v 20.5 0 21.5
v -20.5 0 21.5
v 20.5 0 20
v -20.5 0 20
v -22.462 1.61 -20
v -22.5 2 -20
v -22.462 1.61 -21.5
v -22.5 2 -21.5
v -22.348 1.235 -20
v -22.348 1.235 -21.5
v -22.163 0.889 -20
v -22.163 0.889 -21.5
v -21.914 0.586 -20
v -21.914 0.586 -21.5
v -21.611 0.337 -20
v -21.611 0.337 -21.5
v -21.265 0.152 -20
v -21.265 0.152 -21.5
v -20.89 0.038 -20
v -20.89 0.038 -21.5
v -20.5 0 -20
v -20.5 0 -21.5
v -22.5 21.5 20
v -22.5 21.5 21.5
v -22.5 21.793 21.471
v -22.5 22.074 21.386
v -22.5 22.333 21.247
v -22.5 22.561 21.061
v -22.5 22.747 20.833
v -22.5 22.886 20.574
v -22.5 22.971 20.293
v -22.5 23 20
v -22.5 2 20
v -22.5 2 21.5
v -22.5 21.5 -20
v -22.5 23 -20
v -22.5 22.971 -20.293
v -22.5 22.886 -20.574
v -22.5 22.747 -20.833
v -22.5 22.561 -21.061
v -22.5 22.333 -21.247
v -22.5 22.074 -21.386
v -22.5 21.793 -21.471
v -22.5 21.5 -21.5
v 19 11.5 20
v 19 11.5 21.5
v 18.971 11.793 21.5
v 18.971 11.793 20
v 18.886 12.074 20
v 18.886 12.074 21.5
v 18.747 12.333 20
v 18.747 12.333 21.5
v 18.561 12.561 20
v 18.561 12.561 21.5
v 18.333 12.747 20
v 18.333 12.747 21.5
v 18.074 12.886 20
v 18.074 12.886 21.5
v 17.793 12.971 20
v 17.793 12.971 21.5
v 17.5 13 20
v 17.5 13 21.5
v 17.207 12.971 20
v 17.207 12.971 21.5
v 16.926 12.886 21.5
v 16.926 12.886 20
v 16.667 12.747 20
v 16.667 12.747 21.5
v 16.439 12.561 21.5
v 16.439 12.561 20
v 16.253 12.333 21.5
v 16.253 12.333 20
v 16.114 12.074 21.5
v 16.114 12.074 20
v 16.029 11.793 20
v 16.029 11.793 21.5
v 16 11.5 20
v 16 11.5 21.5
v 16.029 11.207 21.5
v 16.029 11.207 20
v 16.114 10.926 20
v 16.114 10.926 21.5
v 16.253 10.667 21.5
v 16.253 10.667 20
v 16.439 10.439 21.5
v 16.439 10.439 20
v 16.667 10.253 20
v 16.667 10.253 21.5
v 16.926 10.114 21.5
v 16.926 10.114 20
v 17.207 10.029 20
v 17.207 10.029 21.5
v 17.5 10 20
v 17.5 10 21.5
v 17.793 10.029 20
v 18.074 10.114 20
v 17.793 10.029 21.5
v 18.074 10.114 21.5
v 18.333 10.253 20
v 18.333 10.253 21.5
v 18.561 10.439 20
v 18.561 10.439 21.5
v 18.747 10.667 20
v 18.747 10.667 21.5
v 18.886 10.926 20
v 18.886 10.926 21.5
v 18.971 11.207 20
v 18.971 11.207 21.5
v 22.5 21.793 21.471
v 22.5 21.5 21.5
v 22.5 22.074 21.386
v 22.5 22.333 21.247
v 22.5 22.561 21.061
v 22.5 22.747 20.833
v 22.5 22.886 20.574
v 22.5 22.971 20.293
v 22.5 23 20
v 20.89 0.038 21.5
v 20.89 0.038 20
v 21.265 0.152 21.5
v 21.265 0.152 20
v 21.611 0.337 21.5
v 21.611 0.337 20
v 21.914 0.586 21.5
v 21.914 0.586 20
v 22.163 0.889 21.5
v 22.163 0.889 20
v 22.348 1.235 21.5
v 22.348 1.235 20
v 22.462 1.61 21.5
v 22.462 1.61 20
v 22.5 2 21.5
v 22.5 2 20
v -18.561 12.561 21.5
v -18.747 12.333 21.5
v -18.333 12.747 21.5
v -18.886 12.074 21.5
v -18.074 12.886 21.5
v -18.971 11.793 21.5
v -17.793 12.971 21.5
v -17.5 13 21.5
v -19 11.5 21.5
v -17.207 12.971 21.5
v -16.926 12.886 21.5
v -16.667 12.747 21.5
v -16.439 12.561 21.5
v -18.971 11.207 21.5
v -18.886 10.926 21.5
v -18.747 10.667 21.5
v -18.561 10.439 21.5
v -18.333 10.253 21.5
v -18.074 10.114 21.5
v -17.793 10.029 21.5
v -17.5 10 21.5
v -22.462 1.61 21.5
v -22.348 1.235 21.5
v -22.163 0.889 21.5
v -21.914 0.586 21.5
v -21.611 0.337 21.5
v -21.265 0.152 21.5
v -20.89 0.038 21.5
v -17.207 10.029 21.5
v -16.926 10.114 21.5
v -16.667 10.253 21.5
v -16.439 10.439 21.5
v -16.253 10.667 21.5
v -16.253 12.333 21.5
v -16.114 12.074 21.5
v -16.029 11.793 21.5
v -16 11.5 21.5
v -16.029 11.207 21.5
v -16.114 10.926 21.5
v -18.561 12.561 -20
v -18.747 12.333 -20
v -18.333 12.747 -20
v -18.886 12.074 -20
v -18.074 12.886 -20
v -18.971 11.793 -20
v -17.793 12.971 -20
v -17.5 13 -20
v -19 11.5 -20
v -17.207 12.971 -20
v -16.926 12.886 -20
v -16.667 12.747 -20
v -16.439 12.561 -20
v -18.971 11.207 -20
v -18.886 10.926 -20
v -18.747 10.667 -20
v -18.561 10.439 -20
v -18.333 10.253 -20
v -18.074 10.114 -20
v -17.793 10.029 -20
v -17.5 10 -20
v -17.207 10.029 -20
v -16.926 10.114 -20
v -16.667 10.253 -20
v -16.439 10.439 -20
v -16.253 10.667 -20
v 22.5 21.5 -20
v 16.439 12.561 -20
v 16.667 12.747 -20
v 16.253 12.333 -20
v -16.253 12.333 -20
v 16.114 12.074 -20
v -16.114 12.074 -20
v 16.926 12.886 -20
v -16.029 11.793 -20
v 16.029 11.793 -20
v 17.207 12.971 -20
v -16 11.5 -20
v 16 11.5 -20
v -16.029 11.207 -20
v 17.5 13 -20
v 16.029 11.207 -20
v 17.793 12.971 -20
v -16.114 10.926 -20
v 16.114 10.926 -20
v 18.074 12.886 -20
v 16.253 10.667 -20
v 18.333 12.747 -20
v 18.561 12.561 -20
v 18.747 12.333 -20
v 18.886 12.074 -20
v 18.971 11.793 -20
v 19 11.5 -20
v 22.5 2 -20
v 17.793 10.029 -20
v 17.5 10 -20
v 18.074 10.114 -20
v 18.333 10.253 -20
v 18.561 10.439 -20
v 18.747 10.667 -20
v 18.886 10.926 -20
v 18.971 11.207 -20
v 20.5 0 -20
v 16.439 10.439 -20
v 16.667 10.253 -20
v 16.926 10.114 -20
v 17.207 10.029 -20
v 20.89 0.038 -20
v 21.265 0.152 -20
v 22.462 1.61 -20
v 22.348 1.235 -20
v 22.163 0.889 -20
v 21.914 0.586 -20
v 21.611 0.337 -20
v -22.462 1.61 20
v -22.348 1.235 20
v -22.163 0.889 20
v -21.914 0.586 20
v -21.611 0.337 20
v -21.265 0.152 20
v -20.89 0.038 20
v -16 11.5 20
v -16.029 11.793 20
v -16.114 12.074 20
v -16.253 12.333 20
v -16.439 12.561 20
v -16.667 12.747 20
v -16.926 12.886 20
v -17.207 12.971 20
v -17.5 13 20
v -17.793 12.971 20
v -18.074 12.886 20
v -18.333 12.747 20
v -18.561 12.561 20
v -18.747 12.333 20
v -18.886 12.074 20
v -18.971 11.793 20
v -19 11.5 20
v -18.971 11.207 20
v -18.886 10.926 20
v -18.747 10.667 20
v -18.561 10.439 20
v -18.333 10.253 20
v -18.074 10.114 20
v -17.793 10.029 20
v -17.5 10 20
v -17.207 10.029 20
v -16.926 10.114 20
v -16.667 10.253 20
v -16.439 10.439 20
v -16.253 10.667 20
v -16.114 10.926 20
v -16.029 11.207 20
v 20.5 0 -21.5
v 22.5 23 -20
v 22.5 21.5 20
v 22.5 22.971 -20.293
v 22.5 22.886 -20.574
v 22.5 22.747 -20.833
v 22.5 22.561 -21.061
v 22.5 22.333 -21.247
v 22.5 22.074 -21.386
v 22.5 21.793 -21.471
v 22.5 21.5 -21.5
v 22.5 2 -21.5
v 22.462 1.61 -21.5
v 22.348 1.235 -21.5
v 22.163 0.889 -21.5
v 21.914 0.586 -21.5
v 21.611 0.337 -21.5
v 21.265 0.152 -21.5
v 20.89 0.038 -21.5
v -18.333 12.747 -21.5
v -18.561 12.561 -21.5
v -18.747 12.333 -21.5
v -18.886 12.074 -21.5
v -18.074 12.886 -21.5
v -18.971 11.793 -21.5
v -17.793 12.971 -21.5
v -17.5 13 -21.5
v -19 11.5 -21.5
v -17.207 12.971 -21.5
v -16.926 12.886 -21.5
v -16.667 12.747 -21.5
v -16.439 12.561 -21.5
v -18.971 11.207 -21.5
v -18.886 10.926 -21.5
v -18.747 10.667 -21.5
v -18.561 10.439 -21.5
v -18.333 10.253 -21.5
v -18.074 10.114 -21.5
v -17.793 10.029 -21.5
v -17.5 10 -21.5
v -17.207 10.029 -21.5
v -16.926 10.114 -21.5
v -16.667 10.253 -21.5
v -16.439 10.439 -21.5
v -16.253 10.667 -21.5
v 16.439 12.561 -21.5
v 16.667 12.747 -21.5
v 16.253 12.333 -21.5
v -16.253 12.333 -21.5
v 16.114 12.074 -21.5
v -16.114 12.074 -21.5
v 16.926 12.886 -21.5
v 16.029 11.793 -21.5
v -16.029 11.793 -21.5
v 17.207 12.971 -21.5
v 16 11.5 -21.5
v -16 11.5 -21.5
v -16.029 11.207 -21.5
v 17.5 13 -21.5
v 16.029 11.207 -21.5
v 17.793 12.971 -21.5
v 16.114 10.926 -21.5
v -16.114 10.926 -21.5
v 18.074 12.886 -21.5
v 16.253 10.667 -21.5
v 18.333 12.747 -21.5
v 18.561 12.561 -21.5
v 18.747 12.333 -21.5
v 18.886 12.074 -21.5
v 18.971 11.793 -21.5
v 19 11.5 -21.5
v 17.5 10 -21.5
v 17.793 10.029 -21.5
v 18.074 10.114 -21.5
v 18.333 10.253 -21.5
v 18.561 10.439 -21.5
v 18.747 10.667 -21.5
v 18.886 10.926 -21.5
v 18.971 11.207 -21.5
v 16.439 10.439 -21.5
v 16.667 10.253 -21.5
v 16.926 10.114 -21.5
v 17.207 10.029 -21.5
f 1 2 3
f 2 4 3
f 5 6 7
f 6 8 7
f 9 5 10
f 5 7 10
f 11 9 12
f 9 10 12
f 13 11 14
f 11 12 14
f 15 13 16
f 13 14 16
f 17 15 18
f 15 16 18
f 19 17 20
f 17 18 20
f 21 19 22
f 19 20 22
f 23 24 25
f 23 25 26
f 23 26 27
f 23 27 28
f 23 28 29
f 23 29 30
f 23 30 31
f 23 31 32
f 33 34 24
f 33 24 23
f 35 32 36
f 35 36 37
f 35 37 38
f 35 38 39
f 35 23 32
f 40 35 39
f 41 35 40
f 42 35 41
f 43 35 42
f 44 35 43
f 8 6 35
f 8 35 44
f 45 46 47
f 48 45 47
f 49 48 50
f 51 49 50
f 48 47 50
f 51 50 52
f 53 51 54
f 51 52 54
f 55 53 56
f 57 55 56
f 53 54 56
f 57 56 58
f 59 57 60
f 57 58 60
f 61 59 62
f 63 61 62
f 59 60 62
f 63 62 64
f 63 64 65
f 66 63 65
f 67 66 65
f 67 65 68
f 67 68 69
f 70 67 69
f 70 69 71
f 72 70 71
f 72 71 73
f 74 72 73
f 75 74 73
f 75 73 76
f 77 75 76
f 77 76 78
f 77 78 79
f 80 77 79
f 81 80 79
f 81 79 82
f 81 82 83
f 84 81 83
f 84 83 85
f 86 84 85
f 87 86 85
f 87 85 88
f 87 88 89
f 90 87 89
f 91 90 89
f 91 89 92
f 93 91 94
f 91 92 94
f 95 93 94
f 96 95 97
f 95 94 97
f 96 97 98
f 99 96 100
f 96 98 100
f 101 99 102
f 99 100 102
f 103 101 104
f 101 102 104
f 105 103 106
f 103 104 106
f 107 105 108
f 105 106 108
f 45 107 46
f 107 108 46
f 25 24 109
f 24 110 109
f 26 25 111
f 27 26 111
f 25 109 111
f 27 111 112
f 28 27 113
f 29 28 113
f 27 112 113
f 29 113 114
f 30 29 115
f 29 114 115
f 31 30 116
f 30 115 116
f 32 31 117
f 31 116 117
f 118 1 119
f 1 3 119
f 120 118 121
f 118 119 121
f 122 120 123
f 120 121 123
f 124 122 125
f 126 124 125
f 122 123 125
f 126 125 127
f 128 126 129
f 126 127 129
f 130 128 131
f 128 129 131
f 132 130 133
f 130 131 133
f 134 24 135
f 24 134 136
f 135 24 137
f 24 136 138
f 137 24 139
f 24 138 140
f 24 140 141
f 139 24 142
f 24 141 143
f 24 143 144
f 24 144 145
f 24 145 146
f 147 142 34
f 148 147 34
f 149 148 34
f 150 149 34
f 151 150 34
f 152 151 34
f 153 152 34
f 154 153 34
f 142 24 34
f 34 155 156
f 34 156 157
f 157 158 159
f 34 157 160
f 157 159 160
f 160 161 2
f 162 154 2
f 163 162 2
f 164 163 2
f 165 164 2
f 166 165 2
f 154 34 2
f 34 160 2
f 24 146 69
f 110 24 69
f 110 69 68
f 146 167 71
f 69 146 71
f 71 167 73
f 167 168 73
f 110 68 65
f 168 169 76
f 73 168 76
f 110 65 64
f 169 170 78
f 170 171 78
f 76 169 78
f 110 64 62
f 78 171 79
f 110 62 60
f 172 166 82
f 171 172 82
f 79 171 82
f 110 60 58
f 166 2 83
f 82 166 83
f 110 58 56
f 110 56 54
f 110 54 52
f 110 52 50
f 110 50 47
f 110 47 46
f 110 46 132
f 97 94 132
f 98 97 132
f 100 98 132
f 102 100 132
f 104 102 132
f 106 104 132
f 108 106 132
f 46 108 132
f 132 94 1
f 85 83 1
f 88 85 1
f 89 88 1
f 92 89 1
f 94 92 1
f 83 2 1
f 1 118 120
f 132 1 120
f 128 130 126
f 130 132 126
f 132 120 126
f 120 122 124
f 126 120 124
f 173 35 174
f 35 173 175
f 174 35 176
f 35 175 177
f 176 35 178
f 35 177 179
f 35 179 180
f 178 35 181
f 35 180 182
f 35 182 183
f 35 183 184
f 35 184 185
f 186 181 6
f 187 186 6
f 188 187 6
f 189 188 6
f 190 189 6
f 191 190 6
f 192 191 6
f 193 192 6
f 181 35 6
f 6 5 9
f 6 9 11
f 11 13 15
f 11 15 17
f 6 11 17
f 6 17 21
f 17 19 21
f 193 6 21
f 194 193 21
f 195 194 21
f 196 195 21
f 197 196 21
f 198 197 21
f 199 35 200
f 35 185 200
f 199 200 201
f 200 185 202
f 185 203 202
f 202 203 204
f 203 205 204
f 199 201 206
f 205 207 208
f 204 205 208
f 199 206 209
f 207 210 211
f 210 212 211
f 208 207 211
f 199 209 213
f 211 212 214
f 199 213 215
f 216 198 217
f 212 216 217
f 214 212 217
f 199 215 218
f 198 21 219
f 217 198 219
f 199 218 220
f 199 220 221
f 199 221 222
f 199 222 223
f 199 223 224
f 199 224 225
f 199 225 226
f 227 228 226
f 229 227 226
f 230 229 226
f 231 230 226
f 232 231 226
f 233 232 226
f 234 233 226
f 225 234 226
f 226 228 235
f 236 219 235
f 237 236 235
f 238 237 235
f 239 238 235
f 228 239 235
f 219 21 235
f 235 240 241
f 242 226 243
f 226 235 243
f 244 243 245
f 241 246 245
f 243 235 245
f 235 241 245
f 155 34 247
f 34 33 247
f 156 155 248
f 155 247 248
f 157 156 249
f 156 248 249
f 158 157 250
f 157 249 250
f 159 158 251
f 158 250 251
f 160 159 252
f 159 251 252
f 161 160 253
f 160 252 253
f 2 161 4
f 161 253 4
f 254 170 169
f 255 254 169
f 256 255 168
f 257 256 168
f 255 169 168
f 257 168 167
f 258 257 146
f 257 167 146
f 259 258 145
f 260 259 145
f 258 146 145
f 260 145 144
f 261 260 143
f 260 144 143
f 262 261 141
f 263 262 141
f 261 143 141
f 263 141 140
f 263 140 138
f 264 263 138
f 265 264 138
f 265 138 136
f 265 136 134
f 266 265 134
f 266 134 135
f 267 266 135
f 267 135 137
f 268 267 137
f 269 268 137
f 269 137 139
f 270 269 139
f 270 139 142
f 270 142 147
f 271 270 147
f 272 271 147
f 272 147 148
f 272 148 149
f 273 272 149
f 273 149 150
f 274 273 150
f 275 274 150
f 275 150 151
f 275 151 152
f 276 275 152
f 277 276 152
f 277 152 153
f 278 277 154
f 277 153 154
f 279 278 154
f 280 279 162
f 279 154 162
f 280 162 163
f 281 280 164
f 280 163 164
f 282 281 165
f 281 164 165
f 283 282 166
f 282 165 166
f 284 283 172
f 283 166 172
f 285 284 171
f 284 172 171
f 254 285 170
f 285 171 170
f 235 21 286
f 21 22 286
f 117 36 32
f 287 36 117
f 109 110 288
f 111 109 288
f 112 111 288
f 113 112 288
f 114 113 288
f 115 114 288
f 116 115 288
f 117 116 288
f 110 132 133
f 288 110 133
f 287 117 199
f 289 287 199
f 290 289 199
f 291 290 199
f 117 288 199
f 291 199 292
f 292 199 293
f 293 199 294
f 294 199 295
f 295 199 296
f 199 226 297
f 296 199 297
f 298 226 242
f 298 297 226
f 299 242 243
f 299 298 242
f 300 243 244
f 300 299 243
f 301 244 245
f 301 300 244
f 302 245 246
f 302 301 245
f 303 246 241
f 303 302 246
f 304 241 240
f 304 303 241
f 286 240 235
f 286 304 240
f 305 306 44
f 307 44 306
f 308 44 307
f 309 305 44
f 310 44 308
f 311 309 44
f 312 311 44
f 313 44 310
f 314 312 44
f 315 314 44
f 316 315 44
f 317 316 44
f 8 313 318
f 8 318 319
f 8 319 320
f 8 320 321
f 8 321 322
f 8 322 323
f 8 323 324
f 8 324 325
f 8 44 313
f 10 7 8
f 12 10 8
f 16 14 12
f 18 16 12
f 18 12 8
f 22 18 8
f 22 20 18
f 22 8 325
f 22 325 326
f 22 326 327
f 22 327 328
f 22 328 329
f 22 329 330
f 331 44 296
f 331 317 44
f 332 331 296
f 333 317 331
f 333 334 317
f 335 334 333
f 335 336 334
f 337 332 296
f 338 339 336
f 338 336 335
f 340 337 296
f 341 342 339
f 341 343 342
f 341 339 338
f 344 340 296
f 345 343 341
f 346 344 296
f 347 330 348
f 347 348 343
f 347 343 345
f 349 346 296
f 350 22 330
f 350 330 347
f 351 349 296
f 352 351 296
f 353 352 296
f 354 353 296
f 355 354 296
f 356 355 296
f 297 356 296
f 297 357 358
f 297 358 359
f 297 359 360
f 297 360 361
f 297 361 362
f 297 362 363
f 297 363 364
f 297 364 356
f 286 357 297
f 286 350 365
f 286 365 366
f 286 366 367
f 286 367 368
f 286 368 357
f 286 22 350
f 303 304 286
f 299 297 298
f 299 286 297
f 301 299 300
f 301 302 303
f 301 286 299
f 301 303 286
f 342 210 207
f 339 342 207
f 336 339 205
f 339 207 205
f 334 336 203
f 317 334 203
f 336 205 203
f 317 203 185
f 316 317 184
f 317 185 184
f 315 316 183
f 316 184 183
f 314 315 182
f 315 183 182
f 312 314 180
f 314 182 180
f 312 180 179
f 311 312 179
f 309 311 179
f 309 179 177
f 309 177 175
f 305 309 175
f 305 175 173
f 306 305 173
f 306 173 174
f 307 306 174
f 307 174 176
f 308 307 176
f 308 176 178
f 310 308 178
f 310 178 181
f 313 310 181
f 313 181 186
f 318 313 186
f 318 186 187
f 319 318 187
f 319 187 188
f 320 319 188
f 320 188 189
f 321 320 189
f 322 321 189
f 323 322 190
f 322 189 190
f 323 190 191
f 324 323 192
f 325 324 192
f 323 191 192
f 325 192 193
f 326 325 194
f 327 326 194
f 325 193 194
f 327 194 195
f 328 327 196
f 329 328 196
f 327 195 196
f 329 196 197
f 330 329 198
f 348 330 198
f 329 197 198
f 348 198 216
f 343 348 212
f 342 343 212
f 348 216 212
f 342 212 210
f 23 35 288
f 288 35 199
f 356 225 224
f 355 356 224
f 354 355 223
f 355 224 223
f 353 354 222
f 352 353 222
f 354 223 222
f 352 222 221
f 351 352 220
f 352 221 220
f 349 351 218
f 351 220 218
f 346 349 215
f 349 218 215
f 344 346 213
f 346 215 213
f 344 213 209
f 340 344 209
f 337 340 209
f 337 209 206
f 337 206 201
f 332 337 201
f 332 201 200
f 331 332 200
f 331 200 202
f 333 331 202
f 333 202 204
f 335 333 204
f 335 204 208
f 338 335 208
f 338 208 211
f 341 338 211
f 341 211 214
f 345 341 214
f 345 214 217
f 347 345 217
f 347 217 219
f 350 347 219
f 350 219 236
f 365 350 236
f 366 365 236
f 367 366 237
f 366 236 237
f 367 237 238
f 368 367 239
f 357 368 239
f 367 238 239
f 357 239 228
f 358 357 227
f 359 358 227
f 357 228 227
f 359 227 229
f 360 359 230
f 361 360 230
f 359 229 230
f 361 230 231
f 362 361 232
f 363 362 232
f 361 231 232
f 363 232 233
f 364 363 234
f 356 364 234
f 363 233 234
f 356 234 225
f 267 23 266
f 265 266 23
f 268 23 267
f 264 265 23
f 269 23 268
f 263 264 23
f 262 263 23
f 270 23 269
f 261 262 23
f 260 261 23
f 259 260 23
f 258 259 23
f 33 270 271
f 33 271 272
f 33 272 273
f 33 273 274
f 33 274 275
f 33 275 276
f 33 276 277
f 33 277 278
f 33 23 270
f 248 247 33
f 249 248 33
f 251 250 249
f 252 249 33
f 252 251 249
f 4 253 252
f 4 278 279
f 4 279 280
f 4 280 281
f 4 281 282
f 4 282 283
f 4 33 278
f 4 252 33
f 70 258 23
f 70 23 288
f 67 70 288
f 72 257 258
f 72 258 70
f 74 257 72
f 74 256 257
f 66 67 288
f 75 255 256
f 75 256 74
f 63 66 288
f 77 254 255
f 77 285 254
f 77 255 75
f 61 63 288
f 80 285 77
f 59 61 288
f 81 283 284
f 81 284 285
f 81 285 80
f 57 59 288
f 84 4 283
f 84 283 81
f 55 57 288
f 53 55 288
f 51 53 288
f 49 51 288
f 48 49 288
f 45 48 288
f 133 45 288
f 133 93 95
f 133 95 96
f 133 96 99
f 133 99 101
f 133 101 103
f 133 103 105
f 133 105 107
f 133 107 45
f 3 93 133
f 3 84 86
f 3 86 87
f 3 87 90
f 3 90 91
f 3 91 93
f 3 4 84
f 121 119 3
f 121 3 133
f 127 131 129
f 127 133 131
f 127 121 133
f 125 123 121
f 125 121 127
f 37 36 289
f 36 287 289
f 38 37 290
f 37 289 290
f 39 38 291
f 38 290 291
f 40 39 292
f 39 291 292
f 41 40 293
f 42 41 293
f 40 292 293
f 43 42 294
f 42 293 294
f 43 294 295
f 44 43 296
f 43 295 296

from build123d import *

# Parameters (mm, degrees)
SKETCH_1_W          = 45
SKETCH_1_H          = 43
EXTRUDE_1_DEPTH     = 23
SHELL_1_T           = -1.5
SKETCH_2_R          = 1.5
CUT_EXTRUDE_1_DEPTH = 54.7052139
FILLET_1_R          = 1.5
FILLET_2_R          = 2


with BuildPart() as part:
    # 草图1 → 凸台-拉伸1 (new body)
    with BuildSketch(Plane(origin=(0, 0, 0), x_dir=(1, 0, 0), z_dir=(0, 1, 0))):
        Rectangle(SKETCH_1_W, SKETCH_1_H)
    extrude(amount=EXTRUDE_1_DEPTH)

    # 抽壳1
    shell_1_openings = [part.faces().sort_by_distance(p)[0] for p in [
        (0, 0, 0),
        (22.5, 11.5, 0),
        (-22.5, 11.5, 0),
    ]]
    offset(amount=SHELL_1_T, openings=shell_1_openings, kind=Kind.INTERSECTION)

    # 草图2 → 切除-拉伸1 (cut, through all)
    with BuildSketch(Plane.XY.offset(21.5)):
        with Locations((-17.5, 11.5)):
            Circle(SKETCH_2_R)
        with Locations((17.5, 11.5)):
            Circle(SKETCH_2_R)
    extrude(amount=-CUT_EXTRUDE_1_DEPTH, mode=Mode.SUBTRACT)

    # 圆角1
    fillet_1_edges = [part.edges().sort_by_distance(p)[0] for p in [
        (0, 23, -21.5),
        (0, 23, 21.5),
    ]]
    fillet(fillet_1_edges, radius=FILLET_1_R)

    # 圆角2
    fillet_2_edges = [part.edges().sort_by_distance(p)[0] for p in [
        (-22.5, 0, 20.75),
        (22.5, 0, -20.75),
        (22.5, 0, 20.75),
        (-22.5, 0, -20.75),
    ]]
    fillet(fillet_2_edges, radius=FILLET_2_R)


solid = part.part
